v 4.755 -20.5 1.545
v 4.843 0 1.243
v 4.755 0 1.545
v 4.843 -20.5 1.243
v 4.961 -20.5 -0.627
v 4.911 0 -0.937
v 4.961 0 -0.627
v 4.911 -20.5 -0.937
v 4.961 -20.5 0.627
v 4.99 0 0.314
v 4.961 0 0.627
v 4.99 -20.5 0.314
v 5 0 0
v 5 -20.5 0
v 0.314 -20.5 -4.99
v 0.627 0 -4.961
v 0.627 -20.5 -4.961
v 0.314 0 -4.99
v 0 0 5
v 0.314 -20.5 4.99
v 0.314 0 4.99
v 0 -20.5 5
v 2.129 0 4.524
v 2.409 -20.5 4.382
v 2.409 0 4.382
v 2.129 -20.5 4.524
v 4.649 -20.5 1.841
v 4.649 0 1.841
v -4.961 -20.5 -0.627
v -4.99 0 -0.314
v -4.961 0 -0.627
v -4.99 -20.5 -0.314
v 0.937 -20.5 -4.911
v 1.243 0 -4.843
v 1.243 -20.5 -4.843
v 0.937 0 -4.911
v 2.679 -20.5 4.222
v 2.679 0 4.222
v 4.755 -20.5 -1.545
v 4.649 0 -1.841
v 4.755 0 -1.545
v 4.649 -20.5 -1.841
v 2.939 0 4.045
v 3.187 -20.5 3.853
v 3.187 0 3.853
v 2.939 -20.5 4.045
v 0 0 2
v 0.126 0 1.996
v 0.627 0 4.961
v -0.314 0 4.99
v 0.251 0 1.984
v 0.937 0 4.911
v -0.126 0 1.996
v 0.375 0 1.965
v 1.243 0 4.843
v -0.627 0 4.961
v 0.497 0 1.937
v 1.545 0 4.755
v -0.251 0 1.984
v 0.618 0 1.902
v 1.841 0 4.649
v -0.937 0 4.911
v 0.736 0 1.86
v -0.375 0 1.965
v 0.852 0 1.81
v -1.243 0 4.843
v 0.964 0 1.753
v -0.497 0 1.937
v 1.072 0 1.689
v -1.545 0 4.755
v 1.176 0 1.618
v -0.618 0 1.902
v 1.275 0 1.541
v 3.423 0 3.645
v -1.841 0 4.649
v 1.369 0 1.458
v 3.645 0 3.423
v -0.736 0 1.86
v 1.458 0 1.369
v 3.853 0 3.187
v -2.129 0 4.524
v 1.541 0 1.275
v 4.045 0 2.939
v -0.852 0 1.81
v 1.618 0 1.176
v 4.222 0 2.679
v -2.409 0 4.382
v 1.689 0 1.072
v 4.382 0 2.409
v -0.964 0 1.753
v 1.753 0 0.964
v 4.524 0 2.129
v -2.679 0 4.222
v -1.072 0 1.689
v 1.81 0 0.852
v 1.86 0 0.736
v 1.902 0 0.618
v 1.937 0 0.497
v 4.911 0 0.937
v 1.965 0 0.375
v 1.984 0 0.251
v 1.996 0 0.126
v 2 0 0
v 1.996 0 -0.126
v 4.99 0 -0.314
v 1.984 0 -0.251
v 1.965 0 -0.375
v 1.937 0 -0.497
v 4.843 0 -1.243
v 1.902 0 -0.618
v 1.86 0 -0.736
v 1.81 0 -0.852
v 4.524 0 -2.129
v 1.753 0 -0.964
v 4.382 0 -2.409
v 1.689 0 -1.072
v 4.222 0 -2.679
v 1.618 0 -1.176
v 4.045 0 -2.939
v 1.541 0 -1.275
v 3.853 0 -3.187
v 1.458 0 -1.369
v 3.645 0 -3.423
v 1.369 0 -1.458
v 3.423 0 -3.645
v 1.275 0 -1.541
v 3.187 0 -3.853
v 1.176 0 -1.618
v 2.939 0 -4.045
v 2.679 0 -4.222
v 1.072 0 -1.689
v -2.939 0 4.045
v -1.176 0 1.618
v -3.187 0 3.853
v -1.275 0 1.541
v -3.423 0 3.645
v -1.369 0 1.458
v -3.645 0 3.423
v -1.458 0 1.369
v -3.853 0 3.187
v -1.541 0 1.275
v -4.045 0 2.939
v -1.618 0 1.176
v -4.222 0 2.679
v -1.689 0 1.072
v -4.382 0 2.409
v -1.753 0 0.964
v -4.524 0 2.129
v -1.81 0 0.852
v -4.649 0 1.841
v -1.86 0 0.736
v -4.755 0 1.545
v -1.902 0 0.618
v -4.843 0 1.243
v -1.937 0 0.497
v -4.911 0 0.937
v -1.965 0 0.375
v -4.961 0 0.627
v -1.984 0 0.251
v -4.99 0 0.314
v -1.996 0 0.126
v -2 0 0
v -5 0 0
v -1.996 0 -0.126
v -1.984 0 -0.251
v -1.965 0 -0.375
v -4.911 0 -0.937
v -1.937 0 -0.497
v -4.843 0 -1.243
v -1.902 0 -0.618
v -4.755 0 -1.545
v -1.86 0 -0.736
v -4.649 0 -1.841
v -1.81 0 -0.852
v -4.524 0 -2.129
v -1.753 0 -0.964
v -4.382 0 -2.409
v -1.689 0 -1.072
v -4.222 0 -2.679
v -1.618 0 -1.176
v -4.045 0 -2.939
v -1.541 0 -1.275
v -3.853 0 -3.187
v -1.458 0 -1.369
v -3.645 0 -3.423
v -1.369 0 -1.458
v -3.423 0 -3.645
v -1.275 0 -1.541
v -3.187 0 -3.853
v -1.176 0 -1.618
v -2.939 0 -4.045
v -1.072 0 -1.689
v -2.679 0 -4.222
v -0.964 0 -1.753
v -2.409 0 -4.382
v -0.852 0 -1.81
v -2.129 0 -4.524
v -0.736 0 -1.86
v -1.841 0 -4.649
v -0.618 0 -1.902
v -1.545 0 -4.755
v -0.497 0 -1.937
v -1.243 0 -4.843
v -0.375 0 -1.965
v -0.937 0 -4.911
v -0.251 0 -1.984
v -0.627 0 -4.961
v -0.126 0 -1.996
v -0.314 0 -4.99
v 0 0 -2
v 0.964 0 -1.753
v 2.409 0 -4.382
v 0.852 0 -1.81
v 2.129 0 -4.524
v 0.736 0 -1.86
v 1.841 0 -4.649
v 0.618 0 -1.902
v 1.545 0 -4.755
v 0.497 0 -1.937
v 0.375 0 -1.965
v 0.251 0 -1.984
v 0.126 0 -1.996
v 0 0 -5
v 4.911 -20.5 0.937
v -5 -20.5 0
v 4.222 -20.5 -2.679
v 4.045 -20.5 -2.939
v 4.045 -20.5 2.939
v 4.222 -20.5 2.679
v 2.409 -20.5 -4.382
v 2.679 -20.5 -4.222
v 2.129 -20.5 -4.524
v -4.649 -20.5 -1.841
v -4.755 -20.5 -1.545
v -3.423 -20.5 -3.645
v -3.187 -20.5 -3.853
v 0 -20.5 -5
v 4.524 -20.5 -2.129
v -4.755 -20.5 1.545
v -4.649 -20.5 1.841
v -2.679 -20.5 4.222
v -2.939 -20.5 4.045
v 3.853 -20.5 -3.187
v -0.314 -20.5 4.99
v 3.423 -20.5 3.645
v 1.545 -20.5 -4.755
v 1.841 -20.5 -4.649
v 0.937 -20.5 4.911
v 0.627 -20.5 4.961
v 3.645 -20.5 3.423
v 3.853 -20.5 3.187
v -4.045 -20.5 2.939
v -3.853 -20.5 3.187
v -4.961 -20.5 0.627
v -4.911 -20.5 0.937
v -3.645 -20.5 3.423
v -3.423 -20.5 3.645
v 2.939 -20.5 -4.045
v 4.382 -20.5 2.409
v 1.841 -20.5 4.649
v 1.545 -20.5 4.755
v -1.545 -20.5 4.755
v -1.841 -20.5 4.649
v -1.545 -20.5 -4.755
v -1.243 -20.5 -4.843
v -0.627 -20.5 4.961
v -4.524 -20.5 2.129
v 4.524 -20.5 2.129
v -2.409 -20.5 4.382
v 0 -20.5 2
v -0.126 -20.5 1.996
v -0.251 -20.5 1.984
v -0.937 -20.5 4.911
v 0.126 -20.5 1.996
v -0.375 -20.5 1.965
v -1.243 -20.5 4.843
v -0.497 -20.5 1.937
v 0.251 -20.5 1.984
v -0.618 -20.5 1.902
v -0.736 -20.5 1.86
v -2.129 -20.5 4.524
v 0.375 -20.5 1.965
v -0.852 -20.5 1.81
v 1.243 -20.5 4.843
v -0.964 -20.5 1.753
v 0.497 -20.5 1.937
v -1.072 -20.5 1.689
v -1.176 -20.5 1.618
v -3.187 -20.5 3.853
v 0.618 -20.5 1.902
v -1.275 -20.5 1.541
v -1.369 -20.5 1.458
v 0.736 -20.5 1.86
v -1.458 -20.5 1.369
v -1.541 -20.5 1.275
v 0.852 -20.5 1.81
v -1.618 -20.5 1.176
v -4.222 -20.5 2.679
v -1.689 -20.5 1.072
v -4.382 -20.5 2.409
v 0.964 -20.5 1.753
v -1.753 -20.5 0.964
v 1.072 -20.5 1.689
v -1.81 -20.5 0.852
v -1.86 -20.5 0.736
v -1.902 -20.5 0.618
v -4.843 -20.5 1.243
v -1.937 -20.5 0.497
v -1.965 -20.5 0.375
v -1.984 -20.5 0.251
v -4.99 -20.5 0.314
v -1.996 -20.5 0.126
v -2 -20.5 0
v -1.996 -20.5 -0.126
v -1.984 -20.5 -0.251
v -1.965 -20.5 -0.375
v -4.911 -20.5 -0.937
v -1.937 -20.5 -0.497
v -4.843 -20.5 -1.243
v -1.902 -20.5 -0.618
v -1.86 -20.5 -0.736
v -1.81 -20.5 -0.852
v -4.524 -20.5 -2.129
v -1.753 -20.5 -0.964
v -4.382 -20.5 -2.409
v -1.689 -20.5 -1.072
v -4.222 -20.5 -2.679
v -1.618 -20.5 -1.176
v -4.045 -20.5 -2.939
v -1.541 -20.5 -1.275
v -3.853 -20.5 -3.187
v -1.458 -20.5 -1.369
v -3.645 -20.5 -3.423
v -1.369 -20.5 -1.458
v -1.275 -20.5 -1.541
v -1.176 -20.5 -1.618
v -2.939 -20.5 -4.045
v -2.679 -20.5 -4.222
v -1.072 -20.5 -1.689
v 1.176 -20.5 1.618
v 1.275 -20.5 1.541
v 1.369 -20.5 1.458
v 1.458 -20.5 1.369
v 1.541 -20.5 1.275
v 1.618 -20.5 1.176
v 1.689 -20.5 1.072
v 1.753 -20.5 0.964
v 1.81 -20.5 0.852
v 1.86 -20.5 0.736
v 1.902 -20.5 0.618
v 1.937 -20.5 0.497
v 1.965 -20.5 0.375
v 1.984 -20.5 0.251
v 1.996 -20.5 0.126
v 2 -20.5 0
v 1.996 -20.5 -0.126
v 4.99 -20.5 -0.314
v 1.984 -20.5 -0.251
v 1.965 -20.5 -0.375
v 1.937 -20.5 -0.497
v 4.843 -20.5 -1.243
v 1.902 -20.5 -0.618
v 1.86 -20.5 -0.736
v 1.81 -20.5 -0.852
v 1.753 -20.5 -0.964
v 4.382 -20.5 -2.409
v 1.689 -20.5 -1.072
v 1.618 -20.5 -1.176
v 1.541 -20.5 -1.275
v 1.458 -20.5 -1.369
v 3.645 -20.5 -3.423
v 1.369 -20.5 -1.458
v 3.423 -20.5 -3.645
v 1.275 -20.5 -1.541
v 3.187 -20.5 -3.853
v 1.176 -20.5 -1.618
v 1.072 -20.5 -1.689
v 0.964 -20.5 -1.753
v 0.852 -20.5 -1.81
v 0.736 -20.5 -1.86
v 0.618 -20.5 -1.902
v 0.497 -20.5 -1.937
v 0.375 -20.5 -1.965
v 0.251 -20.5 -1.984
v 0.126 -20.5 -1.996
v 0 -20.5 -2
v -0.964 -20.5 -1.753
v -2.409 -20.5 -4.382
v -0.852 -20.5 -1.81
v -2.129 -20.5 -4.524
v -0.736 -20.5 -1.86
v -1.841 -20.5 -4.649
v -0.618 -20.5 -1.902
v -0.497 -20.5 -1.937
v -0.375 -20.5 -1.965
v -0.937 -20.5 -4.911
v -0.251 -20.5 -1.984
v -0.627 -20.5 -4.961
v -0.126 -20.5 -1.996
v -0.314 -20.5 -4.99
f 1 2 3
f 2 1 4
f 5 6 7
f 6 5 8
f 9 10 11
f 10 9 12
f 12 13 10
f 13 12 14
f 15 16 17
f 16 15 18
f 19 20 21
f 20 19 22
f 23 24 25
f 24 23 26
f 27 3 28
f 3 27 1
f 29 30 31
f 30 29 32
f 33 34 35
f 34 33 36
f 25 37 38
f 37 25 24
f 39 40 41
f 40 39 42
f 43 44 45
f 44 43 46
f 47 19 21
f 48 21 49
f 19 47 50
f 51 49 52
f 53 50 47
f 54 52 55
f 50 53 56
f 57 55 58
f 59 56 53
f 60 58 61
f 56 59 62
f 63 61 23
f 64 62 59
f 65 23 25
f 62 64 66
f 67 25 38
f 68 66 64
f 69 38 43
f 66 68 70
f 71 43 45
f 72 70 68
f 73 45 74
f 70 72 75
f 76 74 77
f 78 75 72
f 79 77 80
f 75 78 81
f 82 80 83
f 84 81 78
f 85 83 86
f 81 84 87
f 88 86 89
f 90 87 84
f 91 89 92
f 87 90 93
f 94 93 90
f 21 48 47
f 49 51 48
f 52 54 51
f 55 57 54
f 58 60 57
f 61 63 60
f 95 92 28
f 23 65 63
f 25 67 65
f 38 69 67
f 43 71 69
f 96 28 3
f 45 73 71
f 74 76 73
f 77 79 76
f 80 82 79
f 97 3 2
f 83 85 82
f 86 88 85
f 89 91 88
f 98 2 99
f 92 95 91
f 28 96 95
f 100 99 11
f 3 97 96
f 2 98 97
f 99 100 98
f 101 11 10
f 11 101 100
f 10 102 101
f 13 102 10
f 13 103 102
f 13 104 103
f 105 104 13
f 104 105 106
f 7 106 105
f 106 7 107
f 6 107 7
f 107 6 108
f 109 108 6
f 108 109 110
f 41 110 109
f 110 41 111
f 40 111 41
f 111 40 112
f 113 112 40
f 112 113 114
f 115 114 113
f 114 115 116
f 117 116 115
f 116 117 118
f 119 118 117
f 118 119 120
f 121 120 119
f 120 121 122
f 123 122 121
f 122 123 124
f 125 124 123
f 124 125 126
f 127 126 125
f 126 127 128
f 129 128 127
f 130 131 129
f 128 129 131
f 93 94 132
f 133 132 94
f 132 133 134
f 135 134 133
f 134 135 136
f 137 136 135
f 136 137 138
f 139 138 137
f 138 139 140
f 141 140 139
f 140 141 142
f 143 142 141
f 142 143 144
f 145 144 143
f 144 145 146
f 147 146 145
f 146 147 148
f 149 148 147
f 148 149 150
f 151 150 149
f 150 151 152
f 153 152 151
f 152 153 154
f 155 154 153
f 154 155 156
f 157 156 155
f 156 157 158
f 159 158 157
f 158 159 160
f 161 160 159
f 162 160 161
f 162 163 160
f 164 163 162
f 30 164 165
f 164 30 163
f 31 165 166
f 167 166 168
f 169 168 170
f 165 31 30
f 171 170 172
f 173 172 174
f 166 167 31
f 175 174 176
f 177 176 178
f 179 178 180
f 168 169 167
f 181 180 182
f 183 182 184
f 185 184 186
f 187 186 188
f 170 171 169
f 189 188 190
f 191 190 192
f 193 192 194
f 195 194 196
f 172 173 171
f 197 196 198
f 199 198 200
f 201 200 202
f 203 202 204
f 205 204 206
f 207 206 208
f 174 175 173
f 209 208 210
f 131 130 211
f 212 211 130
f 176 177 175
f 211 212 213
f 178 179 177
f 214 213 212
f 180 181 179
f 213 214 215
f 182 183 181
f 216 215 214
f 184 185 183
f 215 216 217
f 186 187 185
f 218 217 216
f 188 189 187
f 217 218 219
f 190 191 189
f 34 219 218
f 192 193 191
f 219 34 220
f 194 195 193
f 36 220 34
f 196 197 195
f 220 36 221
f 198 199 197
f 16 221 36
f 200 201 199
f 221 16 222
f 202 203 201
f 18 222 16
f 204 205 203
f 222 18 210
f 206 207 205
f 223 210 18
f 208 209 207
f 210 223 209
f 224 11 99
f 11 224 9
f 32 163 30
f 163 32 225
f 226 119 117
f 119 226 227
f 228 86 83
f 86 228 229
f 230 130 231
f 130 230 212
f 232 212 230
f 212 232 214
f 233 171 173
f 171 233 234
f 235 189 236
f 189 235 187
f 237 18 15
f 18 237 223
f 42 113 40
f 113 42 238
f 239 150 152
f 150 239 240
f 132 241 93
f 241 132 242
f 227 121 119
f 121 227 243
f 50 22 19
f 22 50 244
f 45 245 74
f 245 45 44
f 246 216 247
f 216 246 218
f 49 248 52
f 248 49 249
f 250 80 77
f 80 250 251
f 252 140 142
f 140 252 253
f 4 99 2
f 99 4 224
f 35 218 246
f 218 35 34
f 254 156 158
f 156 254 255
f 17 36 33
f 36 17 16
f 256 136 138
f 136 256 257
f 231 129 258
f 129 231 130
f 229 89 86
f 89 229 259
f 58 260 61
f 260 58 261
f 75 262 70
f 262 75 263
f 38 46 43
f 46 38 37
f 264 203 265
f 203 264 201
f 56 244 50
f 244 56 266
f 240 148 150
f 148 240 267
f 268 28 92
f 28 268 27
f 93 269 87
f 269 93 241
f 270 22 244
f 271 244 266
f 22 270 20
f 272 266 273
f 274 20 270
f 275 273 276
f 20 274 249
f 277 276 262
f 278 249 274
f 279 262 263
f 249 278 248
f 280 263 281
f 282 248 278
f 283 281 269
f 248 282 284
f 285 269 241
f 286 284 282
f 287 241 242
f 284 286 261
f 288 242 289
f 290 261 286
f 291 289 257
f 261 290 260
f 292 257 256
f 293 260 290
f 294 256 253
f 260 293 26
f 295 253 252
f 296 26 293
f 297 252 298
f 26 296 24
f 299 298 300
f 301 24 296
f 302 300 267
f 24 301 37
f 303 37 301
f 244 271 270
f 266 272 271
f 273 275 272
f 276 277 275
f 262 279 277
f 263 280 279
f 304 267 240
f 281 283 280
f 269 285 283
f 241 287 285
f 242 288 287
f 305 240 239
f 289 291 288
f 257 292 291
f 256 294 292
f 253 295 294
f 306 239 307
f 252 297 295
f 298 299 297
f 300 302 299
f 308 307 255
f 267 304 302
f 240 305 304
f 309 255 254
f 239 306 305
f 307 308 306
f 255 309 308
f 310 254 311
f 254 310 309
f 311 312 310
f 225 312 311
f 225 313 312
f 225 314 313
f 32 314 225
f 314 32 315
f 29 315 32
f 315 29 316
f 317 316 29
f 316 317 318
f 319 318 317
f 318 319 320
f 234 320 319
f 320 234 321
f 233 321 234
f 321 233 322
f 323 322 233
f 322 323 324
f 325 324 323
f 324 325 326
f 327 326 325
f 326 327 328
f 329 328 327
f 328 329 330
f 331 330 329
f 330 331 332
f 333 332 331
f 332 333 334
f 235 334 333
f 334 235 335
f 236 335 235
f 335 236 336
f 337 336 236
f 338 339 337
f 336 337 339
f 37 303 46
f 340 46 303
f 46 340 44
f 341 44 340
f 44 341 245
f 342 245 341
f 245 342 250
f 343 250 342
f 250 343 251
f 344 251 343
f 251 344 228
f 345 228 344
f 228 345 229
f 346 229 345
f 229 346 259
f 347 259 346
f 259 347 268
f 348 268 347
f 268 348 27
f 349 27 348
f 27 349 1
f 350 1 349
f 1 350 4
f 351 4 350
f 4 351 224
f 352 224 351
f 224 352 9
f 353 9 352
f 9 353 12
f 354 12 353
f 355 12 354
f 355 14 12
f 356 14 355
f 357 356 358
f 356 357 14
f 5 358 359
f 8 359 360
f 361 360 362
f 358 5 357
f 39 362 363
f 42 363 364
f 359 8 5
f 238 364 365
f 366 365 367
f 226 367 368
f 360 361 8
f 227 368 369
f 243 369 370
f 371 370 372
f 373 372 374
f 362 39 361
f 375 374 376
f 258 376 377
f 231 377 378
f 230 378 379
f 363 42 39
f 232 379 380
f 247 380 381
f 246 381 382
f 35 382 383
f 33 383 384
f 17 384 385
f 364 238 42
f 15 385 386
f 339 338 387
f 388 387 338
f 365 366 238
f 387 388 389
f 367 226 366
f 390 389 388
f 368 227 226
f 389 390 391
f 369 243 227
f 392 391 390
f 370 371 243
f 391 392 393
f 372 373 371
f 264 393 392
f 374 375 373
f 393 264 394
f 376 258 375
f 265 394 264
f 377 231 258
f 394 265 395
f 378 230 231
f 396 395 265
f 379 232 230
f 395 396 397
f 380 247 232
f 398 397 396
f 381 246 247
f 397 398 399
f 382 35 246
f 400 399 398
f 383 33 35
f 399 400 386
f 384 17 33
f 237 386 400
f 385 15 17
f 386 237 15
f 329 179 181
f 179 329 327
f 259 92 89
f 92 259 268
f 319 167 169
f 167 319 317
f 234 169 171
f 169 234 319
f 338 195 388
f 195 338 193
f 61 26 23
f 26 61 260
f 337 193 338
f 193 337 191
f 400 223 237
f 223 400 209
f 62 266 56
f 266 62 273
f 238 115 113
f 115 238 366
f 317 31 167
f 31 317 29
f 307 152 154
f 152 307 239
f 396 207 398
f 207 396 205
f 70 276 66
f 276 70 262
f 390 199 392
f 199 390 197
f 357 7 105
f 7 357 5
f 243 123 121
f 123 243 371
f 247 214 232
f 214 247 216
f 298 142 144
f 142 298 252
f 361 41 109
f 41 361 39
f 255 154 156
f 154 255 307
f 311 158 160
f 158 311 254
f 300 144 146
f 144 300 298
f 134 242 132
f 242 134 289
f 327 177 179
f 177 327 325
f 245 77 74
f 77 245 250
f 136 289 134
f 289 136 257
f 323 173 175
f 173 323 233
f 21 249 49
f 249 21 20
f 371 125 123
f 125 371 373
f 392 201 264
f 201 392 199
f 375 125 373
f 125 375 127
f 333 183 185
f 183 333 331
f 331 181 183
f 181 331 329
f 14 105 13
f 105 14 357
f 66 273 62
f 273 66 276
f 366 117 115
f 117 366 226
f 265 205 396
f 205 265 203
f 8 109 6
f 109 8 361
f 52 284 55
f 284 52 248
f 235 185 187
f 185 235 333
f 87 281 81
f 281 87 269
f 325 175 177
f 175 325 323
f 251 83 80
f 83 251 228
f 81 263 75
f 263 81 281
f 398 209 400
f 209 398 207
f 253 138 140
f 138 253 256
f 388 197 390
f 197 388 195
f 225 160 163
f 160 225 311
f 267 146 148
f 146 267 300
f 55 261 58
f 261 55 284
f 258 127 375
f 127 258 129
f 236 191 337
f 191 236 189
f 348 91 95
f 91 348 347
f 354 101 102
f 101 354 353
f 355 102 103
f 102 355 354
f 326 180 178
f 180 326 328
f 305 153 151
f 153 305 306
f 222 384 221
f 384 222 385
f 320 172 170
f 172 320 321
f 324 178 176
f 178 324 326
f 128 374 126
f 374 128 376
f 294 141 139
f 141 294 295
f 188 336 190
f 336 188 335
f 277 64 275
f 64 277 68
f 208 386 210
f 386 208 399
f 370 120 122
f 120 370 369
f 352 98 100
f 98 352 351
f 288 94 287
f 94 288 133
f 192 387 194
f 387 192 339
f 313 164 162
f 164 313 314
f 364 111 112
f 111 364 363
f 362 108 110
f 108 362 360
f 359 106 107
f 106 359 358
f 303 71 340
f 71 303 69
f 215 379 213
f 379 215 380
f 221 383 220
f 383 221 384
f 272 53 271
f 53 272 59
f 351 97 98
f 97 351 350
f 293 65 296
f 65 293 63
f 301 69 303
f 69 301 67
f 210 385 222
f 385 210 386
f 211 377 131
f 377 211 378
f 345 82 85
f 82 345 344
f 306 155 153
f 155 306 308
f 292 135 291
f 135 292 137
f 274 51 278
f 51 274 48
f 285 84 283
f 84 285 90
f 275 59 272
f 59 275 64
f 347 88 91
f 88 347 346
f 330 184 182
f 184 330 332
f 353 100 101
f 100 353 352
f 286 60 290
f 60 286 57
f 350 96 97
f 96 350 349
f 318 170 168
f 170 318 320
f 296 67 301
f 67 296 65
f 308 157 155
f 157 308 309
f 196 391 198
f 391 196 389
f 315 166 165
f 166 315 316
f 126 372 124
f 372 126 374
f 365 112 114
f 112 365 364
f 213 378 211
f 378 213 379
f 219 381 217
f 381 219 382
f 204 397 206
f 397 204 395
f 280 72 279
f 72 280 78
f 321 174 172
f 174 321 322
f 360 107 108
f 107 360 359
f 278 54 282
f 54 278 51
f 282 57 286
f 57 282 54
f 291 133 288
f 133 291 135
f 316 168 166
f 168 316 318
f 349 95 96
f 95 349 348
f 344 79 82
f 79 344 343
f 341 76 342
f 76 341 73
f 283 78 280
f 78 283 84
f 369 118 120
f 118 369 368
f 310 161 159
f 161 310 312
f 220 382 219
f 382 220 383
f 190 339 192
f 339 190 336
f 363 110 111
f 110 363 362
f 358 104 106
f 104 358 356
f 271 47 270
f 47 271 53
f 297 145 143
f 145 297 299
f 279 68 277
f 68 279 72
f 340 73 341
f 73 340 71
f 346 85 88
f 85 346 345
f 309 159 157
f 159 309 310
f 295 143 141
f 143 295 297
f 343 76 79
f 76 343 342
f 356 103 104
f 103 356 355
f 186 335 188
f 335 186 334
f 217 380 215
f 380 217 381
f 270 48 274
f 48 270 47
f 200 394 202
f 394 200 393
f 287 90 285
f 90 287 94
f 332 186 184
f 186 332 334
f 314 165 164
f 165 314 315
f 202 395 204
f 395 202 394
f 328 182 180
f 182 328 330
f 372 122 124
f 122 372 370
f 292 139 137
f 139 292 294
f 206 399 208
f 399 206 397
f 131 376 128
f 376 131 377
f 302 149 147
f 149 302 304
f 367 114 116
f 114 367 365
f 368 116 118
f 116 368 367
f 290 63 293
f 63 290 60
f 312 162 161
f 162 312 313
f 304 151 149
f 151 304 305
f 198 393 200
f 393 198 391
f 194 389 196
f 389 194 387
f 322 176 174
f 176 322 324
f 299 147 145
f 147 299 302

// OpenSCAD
 difference(){
   union(){
       

        translate([0,0,0]){
            rotate([90,0,00]){
              cylinder(h=20.5, r=5, $fn=100, center=false);
            }
        }          


        

    }
    union() {

        translate([0,1,0]){
            rotate([90,0,0]){
              cylinder(h=99, r=2, $fn=100, center=false);
            }
        }  
    }
}
